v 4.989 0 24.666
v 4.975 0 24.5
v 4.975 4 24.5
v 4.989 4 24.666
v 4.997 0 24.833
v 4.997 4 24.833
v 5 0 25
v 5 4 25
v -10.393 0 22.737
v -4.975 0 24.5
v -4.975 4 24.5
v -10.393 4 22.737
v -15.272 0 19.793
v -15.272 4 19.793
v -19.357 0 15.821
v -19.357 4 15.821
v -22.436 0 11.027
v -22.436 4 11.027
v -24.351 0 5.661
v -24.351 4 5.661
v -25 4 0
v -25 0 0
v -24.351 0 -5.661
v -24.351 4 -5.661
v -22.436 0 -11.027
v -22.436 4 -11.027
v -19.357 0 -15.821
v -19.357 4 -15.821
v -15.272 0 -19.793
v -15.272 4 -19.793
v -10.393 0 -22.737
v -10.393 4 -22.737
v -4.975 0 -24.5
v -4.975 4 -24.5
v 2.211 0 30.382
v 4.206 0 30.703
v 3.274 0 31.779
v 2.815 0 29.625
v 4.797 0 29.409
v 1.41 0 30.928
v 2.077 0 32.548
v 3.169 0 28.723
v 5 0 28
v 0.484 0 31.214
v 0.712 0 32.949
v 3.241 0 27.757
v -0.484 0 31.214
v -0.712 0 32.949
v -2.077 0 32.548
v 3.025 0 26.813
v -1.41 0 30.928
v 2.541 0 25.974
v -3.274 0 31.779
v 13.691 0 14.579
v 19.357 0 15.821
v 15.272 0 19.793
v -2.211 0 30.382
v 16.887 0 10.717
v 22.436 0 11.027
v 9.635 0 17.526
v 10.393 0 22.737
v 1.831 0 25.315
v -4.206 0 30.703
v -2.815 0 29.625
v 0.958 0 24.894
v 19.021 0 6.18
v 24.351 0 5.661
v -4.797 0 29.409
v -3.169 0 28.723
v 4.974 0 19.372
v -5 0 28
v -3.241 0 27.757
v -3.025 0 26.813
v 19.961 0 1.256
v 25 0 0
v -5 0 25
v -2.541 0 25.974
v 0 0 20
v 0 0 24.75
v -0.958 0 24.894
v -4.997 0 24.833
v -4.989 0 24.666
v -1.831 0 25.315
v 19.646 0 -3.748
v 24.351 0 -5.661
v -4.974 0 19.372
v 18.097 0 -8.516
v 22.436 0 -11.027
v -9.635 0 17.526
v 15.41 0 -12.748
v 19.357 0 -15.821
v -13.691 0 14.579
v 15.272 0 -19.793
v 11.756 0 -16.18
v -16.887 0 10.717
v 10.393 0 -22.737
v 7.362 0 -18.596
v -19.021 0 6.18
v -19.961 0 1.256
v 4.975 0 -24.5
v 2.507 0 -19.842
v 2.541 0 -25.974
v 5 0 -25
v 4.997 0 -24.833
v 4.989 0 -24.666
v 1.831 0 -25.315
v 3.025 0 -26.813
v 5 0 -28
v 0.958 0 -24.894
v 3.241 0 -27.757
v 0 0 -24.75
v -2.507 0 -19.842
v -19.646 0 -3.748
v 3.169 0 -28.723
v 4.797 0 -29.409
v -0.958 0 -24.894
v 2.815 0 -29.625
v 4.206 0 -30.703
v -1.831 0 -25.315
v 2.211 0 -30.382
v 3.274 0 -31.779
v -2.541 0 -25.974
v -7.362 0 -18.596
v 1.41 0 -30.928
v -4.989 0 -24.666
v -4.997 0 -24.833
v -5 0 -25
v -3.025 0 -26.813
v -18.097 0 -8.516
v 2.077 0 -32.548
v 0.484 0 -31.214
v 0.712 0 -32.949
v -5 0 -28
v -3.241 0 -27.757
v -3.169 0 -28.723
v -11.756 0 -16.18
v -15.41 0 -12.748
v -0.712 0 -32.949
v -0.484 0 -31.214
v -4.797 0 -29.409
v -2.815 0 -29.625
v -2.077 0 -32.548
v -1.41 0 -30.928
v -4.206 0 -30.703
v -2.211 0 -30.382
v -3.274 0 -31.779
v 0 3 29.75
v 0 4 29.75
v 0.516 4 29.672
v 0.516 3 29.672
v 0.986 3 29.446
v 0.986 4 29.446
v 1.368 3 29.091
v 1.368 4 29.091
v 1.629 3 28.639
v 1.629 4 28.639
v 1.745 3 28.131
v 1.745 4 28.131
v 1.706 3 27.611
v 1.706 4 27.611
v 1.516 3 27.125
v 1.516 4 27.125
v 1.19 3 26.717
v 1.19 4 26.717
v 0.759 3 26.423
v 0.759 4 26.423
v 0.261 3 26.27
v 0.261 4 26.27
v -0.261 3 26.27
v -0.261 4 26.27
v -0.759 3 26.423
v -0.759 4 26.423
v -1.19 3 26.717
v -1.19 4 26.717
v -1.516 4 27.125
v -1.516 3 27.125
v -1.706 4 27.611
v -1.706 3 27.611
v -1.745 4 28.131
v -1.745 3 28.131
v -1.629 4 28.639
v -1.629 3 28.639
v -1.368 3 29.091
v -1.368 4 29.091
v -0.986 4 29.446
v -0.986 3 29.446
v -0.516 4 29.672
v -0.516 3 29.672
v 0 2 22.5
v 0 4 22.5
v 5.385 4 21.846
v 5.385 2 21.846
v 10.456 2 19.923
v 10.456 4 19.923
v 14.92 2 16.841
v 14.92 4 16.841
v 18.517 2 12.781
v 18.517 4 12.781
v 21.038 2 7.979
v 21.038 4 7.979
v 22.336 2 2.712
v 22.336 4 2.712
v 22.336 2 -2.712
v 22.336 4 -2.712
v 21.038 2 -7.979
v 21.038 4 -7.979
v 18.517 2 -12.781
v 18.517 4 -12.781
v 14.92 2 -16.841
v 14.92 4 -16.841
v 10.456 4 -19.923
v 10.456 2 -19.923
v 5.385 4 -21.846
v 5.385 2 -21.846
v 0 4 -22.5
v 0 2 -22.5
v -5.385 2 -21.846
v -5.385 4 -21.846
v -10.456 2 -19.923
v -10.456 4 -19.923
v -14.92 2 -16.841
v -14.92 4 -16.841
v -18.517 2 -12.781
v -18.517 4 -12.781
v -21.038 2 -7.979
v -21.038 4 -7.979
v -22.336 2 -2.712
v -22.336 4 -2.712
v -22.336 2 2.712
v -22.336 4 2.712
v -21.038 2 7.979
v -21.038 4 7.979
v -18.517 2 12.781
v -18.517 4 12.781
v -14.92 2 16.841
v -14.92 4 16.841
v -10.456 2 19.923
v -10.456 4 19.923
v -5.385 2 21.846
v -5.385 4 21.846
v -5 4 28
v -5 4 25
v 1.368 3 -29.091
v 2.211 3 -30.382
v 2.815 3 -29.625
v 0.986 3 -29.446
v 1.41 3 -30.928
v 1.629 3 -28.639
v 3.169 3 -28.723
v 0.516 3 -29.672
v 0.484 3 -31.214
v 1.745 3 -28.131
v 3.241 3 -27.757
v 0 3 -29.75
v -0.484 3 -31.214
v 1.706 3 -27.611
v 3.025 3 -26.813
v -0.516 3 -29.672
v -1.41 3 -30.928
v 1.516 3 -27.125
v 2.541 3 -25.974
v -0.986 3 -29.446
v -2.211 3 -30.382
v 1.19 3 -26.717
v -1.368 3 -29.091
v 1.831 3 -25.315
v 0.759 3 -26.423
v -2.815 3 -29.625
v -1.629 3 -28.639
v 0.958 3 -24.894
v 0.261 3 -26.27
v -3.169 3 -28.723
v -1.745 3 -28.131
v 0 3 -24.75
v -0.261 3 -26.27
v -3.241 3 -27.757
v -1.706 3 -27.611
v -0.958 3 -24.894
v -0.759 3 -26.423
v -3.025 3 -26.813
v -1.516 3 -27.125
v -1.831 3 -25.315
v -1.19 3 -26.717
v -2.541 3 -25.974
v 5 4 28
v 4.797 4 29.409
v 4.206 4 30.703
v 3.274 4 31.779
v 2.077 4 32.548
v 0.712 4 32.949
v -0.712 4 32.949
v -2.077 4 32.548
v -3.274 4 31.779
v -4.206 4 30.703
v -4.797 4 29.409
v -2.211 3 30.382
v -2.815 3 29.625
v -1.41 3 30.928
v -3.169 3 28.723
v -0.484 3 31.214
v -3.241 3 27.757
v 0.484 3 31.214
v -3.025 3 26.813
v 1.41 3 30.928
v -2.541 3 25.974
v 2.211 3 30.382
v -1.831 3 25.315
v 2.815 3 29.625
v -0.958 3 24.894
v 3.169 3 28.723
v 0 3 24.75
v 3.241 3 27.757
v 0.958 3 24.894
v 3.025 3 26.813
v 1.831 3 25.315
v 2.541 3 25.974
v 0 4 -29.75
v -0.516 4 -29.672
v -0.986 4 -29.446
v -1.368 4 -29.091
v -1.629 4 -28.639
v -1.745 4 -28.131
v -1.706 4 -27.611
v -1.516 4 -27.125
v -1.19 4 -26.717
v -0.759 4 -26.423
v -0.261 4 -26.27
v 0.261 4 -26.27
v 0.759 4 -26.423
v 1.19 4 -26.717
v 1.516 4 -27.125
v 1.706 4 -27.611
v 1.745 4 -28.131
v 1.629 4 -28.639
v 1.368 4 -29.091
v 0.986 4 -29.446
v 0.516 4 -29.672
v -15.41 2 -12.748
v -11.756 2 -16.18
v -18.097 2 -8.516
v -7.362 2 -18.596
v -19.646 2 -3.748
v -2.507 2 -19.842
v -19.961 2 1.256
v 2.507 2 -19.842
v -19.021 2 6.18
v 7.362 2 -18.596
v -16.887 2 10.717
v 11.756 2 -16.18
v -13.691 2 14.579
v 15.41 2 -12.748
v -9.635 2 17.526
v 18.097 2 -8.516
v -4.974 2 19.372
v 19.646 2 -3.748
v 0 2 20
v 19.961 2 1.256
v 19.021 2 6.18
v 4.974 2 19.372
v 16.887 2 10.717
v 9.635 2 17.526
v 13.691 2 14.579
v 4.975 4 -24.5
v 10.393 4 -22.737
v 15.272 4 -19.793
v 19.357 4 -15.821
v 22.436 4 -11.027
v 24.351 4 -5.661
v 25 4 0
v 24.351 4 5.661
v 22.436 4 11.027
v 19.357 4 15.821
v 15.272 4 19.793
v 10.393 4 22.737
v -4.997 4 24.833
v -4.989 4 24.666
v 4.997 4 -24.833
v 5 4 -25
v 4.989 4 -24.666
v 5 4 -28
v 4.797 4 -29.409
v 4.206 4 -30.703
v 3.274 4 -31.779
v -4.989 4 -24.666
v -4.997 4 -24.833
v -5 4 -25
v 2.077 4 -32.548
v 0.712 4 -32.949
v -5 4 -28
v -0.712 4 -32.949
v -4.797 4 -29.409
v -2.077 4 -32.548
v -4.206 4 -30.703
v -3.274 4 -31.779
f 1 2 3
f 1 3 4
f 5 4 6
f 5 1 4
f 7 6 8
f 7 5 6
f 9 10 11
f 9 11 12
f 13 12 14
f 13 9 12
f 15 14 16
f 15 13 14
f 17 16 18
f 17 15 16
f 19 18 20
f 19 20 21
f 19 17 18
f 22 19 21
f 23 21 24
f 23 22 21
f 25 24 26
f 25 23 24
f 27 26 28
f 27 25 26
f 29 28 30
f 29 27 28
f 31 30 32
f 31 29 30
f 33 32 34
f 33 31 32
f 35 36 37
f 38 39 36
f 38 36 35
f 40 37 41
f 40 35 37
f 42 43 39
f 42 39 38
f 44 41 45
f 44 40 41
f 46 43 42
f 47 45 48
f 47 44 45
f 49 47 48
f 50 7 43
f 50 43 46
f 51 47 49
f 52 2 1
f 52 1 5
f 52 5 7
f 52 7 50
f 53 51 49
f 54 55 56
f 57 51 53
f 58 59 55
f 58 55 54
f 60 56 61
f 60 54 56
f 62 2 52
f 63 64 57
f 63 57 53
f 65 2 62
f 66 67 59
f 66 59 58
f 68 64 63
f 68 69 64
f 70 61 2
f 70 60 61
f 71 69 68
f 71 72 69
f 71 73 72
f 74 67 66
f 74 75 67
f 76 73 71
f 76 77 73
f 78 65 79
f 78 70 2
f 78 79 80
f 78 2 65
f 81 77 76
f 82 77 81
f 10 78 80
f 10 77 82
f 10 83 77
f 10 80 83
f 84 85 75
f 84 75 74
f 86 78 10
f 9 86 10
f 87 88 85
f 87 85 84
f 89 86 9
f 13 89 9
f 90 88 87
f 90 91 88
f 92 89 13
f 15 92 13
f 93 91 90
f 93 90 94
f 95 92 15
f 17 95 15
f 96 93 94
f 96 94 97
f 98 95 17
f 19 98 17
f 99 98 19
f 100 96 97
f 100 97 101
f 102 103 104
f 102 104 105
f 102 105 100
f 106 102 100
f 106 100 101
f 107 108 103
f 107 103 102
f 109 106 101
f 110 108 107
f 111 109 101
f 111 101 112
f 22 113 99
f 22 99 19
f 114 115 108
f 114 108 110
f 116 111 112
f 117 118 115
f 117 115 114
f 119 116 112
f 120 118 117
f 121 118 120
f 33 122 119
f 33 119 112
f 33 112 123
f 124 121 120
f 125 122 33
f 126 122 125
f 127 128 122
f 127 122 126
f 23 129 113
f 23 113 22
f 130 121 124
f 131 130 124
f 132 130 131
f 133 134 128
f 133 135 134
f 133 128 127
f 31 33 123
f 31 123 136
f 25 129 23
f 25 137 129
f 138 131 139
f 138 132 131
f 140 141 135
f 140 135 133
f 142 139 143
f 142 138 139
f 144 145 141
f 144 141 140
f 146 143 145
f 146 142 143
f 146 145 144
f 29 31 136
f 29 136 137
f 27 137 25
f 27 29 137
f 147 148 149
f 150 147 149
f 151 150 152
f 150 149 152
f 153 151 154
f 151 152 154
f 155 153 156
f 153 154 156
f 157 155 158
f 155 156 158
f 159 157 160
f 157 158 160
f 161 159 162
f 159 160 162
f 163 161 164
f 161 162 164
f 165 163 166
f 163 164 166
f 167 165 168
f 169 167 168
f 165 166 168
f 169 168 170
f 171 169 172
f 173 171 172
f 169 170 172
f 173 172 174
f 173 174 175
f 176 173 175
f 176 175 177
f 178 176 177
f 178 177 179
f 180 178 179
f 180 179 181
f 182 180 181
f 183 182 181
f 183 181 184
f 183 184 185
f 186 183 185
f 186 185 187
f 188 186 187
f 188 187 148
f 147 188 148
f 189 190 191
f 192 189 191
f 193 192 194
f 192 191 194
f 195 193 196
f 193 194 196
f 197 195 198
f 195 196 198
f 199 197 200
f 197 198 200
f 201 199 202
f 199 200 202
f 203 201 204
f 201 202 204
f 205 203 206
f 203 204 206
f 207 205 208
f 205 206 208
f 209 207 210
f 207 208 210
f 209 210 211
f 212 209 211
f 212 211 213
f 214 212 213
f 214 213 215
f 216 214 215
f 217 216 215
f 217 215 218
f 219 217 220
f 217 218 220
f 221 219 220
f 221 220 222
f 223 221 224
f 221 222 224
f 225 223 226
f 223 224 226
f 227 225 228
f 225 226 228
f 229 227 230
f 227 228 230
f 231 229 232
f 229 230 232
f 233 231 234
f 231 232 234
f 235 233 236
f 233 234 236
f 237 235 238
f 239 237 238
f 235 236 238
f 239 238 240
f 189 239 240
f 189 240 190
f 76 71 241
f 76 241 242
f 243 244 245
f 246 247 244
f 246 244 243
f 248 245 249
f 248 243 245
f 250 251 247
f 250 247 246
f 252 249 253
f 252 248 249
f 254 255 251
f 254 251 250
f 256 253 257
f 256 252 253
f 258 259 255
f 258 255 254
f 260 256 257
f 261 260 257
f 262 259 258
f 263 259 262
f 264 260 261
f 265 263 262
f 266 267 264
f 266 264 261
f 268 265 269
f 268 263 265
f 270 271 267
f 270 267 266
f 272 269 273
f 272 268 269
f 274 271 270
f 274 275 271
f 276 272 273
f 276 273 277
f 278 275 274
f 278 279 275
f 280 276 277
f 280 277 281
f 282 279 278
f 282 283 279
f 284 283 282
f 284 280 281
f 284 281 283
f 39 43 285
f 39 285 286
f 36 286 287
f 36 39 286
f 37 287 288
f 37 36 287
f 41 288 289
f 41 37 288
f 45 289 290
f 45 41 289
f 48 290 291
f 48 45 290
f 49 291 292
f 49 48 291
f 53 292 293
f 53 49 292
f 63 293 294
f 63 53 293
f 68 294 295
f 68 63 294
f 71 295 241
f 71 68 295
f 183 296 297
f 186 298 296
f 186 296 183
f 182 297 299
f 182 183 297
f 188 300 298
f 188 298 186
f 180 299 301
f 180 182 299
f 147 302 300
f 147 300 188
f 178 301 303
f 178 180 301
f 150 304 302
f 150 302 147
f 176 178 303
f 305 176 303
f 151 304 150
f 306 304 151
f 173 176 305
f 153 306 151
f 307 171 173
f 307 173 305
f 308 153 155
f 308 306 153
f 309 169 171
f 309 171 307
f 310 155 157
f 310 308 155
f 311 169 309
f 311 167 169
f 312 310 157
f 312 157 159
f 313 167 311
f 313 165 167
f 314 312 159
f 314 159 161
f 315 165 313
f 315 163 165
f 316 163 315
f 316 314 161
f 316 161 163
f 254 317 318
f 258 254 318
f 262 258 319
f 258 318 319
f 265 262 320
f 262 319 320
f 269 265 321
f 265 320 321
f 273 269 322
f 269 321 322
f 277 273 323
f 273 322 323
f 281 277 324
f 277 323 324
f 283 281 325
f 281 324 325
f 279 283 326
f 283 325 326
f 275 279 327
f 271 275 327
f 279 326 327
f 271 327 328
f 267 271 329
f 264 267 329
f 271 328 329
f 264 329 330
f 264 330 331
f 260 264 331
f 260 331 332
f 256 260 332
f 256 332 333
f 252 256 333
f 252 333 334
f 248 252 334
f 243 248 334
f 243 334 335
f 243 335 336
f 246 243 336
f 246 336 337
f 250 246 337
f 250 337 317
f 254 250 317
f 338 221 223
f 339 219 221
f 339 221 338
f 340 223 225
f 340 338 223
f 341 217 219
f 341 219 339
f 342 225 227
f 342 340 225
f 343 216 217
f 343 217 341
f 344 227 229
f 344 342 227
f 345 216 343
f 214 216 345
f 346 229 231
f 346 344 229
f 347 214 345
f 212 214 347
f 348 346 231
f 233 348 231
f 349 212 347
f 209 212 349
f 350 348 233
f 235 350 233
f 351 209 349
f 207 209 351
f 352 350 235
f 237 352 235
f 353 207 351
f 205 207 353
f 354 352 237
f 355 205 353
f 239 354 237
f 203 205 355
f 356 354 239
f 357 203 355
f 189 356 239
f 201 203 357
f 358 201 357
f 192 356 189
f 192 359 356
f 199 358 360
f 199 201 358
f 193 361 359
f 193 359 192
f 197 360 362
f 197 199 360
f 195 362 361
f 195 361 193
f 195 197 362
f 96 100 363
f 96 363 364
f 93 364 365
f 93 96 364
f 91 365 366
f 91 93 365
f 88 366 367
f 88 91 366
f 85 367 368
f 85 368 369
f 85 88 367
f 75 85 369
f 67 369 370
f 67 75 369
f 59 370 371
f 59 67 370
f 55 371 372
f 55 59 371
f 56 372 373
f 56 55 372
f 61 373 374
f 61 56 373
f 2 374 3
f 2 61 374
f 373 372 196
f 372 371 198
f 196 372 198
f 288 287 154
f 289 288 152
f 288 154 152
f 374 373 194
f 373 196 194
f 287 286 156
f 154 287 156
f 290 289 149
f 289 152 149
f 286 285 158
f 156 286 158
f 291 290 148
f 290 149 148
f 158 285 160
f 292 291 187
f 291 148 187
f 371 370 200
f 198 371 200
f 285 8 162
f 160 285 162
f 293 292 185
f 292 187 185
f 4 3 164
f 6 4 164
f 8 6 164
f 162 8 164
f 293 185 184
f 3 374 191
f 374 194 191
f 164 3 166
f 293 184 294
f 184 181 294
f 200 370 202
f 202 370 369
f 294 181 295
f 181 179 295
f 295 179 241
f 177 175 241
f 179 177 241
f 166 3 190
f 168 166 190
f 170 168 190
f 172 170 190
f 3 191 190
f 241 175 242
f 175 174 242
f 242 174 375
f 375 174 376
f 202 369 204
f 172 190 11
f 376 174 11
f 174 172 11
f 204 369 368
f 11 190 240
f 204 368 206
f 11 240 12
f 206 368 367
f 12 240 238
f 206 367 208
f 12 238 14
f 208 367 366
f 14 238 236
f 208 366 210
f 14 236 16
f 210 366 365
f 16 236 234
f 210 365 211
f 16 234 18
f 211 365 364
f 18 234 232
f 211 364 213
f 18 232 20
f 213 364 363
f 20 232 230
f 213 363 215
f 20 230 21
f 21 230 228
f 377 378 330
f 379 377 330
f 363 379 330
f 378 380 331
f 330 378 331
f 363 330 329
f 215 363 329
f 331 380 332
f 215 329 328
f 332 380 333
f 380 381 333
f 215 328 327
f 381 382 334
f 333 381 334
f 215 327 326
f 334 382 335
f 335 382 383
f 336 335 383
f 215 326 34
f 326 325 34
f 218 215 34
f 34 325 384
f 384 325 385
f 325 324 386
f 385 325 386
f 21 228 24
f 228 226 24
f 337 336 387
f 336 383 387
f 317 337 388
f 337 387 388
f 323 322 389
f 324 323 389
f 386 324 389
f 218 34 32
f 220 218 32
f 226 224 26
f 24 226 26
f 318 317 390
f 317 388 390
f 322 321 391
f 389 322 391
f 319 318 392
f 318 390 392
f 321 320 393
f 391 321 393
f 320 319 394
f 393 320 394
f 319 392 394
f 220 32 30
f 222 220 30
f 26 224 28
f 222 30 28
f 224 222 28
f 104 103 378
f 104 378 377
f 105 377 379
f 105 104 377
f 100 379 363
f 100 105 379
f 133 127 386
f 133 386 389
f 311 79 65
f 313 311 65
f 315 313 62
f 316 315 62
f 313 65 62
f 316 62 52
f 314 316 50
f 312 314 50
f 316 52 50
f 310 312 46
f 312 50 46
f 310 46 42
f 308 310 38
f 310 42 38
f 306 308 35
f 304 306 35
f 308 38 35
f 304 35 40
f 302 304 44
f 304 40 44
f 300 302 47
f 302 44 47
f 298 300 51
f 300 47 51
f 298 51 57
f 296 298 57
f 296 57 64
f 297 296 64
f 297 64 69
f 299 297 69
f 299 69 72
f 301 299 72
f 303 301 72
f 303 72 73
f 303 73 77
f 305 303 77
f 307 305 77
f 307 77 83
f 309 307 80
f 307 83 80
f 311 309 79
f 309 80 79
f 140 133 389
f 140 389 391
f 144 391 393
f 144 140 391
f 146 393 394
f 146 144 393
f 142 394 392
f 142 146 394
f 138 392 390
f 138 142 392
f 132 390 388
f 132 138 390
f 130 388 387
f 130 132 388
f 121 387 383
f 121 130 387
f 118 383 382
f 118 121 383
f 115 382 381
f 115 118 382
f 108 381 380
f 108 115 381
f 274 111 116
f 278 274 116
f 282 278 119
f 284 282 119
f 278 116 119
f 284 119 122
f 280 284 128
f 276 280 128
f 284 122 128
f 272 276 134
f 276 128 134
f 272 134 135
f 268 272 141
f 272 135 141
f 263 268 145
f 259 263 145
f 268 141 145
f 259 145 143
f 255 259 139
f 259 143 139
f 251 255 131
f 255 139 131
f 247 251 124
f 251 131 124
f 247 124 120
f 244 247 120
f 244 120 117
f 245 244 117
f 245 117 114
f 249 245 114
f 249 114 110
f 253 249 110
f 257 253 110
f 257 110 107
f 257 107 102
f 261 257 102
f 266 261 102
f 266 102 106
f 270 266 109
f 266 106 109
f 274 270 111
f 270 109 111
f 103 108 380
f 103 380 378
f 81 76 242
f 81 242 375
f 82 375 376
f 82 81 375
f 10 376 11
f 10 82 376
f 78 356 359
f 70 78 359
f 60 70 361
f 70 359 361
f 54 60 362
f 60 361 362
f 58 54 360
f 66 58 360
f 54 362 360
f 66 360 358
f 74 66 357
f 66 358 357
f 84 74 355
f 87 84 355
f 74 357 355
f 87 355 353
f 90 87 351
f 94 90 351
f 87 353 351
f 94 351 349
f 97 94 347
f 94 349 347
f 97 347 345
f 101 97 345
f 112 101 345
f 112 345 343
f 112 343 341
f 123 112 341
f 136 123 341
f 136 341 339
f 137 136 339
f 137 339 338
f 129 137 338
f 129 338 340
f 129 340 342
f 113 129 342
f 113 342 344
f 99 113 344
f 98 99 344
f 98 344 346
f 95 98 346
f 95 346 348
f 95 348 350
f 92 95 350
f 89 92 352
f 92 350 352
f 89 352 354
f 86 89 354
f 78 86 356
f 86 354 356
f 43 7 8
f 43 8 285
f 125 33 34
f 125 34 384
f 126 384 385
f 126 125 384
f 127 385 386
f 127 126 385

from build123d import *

# Parameters (mm, degrees)
BOSS_EXTRUDE1_DEPTH = 4
SKETCH2_R           = 20
CUT_EXTRUDE1_DEPTH  = 42.593268686
SKETCH3_R           = 22.5
CUT_EXTRUDE2_DEPTH  = 2
SKETCH4_R           = 1.75
CUT_EXTRUDE3_DEPTH  = 42.593268686
SKETCH5_R           = 3.25
CUT_EXTRUDE4_DEPTH  = 3


with BuildPart() as part:
    # Sketch1 → Boss-Extrude1 (new body)
    with BuildSketch(Plane(origin=(0, 0, 0), x_dir=(1, 0, 0), z_dir=(0, 1, 0))):
        with BuildLine():
            Line((-5, 25), (-5, 28))
            ThreePointArc((-5, 28), (0, 33), (5, 28))
            Line((5, 28), (5, 25))
            ThreePointArc((5, 25), (4.993730366, 24.749686125), (4.974937186, 24.5))
            ThreePointArc((4.974937186, 24.5), (25, 0), (4.974937186, -24.5))
            ThreePointArc((4.974937186, -24.5), (4.993730366, -24.749686125), (5, -25))
            Line((5, -25), (5, -28))
            ThreePointArc((5, -28), (0, -33), (-5, -28))
            Line((-5, -28), (-5, -25))
            ThreePointArc((-5, -25), (-4.993730366, -24.749686125), (-4.974937186, -24.5))
            ThreePointArc((-4.974937186, -24.5), (-25, 0), (-4.974937186, 24.5))
            ThreePointArc((-4.974937186, 24.5), (-4.993730366, 24.749686125), (-5, 25))
        make_face()
    extrude(amount=BOSS_EXTRUDE1_DEPTH)

    # Sketch2 → Cut-Extrude1 (cut, through all)
    with BuildSketch(Plane(origin=(0, 4, 0), x_dir=(1, 0, 0), z_dir=(0, 1, 0))):
        with Locations(Location((0, 0, 0), (0, 0, 270))):
            Circle(SKETCH2_R)
    extrude(amount=-CUT_EXTRUDE1_DEPTH, mode=Mode.SUBTRACT)

    # Sketch3 → Cut-Extrude2 (cut)
    with BuildSketch(Plane(origin=(0, 4, 0), x_dir=(1, 0, 0), z_dir=(0, 1, 0))):
        with Locations(Location((0, 0, 0), (0, 0, 270))):
            Circle(SKETCH3_R)
    extrude(amount=-CUT_EXTRUDE2_DEPTH, mode=Mode.SUBTRACT)

    # Sketch4 → Cut-Extrude3 (cut, through all)
    with BuildSketch(Plane(origin=(0, 4, 0), x_dir=(1, 0, 0), z_dir=(0, 1, 0))):
        with Locations(Location((0, -28, 0), (0, 0, 270))):
            Circle(SKETCH4_R)
        with Locations(Location((0, 28, 0), (0, 0, 90))):
            Circle(SKETCH4_R)
    extrude(amount=-CUT_EXTRUDE3_DEPTH, mode=Mode.SUBTRACT)

    # Sketch5 → Cut-Extrude4 (cut)
    with BuildSketch(Plane.XZ):
        with Locations(Location((0, 28, 0), (0, 0, 270))):
            Circle(SKETCH5_R)
        with Locations(Location((0, -28, 0), (0, 0, 90))):
            Circle(SKETCH5_R)
    extrude(amount=-CUT_EXTRUDE4_DEPTH, mode=Mode.SUBTRACT)


solid = part.part
